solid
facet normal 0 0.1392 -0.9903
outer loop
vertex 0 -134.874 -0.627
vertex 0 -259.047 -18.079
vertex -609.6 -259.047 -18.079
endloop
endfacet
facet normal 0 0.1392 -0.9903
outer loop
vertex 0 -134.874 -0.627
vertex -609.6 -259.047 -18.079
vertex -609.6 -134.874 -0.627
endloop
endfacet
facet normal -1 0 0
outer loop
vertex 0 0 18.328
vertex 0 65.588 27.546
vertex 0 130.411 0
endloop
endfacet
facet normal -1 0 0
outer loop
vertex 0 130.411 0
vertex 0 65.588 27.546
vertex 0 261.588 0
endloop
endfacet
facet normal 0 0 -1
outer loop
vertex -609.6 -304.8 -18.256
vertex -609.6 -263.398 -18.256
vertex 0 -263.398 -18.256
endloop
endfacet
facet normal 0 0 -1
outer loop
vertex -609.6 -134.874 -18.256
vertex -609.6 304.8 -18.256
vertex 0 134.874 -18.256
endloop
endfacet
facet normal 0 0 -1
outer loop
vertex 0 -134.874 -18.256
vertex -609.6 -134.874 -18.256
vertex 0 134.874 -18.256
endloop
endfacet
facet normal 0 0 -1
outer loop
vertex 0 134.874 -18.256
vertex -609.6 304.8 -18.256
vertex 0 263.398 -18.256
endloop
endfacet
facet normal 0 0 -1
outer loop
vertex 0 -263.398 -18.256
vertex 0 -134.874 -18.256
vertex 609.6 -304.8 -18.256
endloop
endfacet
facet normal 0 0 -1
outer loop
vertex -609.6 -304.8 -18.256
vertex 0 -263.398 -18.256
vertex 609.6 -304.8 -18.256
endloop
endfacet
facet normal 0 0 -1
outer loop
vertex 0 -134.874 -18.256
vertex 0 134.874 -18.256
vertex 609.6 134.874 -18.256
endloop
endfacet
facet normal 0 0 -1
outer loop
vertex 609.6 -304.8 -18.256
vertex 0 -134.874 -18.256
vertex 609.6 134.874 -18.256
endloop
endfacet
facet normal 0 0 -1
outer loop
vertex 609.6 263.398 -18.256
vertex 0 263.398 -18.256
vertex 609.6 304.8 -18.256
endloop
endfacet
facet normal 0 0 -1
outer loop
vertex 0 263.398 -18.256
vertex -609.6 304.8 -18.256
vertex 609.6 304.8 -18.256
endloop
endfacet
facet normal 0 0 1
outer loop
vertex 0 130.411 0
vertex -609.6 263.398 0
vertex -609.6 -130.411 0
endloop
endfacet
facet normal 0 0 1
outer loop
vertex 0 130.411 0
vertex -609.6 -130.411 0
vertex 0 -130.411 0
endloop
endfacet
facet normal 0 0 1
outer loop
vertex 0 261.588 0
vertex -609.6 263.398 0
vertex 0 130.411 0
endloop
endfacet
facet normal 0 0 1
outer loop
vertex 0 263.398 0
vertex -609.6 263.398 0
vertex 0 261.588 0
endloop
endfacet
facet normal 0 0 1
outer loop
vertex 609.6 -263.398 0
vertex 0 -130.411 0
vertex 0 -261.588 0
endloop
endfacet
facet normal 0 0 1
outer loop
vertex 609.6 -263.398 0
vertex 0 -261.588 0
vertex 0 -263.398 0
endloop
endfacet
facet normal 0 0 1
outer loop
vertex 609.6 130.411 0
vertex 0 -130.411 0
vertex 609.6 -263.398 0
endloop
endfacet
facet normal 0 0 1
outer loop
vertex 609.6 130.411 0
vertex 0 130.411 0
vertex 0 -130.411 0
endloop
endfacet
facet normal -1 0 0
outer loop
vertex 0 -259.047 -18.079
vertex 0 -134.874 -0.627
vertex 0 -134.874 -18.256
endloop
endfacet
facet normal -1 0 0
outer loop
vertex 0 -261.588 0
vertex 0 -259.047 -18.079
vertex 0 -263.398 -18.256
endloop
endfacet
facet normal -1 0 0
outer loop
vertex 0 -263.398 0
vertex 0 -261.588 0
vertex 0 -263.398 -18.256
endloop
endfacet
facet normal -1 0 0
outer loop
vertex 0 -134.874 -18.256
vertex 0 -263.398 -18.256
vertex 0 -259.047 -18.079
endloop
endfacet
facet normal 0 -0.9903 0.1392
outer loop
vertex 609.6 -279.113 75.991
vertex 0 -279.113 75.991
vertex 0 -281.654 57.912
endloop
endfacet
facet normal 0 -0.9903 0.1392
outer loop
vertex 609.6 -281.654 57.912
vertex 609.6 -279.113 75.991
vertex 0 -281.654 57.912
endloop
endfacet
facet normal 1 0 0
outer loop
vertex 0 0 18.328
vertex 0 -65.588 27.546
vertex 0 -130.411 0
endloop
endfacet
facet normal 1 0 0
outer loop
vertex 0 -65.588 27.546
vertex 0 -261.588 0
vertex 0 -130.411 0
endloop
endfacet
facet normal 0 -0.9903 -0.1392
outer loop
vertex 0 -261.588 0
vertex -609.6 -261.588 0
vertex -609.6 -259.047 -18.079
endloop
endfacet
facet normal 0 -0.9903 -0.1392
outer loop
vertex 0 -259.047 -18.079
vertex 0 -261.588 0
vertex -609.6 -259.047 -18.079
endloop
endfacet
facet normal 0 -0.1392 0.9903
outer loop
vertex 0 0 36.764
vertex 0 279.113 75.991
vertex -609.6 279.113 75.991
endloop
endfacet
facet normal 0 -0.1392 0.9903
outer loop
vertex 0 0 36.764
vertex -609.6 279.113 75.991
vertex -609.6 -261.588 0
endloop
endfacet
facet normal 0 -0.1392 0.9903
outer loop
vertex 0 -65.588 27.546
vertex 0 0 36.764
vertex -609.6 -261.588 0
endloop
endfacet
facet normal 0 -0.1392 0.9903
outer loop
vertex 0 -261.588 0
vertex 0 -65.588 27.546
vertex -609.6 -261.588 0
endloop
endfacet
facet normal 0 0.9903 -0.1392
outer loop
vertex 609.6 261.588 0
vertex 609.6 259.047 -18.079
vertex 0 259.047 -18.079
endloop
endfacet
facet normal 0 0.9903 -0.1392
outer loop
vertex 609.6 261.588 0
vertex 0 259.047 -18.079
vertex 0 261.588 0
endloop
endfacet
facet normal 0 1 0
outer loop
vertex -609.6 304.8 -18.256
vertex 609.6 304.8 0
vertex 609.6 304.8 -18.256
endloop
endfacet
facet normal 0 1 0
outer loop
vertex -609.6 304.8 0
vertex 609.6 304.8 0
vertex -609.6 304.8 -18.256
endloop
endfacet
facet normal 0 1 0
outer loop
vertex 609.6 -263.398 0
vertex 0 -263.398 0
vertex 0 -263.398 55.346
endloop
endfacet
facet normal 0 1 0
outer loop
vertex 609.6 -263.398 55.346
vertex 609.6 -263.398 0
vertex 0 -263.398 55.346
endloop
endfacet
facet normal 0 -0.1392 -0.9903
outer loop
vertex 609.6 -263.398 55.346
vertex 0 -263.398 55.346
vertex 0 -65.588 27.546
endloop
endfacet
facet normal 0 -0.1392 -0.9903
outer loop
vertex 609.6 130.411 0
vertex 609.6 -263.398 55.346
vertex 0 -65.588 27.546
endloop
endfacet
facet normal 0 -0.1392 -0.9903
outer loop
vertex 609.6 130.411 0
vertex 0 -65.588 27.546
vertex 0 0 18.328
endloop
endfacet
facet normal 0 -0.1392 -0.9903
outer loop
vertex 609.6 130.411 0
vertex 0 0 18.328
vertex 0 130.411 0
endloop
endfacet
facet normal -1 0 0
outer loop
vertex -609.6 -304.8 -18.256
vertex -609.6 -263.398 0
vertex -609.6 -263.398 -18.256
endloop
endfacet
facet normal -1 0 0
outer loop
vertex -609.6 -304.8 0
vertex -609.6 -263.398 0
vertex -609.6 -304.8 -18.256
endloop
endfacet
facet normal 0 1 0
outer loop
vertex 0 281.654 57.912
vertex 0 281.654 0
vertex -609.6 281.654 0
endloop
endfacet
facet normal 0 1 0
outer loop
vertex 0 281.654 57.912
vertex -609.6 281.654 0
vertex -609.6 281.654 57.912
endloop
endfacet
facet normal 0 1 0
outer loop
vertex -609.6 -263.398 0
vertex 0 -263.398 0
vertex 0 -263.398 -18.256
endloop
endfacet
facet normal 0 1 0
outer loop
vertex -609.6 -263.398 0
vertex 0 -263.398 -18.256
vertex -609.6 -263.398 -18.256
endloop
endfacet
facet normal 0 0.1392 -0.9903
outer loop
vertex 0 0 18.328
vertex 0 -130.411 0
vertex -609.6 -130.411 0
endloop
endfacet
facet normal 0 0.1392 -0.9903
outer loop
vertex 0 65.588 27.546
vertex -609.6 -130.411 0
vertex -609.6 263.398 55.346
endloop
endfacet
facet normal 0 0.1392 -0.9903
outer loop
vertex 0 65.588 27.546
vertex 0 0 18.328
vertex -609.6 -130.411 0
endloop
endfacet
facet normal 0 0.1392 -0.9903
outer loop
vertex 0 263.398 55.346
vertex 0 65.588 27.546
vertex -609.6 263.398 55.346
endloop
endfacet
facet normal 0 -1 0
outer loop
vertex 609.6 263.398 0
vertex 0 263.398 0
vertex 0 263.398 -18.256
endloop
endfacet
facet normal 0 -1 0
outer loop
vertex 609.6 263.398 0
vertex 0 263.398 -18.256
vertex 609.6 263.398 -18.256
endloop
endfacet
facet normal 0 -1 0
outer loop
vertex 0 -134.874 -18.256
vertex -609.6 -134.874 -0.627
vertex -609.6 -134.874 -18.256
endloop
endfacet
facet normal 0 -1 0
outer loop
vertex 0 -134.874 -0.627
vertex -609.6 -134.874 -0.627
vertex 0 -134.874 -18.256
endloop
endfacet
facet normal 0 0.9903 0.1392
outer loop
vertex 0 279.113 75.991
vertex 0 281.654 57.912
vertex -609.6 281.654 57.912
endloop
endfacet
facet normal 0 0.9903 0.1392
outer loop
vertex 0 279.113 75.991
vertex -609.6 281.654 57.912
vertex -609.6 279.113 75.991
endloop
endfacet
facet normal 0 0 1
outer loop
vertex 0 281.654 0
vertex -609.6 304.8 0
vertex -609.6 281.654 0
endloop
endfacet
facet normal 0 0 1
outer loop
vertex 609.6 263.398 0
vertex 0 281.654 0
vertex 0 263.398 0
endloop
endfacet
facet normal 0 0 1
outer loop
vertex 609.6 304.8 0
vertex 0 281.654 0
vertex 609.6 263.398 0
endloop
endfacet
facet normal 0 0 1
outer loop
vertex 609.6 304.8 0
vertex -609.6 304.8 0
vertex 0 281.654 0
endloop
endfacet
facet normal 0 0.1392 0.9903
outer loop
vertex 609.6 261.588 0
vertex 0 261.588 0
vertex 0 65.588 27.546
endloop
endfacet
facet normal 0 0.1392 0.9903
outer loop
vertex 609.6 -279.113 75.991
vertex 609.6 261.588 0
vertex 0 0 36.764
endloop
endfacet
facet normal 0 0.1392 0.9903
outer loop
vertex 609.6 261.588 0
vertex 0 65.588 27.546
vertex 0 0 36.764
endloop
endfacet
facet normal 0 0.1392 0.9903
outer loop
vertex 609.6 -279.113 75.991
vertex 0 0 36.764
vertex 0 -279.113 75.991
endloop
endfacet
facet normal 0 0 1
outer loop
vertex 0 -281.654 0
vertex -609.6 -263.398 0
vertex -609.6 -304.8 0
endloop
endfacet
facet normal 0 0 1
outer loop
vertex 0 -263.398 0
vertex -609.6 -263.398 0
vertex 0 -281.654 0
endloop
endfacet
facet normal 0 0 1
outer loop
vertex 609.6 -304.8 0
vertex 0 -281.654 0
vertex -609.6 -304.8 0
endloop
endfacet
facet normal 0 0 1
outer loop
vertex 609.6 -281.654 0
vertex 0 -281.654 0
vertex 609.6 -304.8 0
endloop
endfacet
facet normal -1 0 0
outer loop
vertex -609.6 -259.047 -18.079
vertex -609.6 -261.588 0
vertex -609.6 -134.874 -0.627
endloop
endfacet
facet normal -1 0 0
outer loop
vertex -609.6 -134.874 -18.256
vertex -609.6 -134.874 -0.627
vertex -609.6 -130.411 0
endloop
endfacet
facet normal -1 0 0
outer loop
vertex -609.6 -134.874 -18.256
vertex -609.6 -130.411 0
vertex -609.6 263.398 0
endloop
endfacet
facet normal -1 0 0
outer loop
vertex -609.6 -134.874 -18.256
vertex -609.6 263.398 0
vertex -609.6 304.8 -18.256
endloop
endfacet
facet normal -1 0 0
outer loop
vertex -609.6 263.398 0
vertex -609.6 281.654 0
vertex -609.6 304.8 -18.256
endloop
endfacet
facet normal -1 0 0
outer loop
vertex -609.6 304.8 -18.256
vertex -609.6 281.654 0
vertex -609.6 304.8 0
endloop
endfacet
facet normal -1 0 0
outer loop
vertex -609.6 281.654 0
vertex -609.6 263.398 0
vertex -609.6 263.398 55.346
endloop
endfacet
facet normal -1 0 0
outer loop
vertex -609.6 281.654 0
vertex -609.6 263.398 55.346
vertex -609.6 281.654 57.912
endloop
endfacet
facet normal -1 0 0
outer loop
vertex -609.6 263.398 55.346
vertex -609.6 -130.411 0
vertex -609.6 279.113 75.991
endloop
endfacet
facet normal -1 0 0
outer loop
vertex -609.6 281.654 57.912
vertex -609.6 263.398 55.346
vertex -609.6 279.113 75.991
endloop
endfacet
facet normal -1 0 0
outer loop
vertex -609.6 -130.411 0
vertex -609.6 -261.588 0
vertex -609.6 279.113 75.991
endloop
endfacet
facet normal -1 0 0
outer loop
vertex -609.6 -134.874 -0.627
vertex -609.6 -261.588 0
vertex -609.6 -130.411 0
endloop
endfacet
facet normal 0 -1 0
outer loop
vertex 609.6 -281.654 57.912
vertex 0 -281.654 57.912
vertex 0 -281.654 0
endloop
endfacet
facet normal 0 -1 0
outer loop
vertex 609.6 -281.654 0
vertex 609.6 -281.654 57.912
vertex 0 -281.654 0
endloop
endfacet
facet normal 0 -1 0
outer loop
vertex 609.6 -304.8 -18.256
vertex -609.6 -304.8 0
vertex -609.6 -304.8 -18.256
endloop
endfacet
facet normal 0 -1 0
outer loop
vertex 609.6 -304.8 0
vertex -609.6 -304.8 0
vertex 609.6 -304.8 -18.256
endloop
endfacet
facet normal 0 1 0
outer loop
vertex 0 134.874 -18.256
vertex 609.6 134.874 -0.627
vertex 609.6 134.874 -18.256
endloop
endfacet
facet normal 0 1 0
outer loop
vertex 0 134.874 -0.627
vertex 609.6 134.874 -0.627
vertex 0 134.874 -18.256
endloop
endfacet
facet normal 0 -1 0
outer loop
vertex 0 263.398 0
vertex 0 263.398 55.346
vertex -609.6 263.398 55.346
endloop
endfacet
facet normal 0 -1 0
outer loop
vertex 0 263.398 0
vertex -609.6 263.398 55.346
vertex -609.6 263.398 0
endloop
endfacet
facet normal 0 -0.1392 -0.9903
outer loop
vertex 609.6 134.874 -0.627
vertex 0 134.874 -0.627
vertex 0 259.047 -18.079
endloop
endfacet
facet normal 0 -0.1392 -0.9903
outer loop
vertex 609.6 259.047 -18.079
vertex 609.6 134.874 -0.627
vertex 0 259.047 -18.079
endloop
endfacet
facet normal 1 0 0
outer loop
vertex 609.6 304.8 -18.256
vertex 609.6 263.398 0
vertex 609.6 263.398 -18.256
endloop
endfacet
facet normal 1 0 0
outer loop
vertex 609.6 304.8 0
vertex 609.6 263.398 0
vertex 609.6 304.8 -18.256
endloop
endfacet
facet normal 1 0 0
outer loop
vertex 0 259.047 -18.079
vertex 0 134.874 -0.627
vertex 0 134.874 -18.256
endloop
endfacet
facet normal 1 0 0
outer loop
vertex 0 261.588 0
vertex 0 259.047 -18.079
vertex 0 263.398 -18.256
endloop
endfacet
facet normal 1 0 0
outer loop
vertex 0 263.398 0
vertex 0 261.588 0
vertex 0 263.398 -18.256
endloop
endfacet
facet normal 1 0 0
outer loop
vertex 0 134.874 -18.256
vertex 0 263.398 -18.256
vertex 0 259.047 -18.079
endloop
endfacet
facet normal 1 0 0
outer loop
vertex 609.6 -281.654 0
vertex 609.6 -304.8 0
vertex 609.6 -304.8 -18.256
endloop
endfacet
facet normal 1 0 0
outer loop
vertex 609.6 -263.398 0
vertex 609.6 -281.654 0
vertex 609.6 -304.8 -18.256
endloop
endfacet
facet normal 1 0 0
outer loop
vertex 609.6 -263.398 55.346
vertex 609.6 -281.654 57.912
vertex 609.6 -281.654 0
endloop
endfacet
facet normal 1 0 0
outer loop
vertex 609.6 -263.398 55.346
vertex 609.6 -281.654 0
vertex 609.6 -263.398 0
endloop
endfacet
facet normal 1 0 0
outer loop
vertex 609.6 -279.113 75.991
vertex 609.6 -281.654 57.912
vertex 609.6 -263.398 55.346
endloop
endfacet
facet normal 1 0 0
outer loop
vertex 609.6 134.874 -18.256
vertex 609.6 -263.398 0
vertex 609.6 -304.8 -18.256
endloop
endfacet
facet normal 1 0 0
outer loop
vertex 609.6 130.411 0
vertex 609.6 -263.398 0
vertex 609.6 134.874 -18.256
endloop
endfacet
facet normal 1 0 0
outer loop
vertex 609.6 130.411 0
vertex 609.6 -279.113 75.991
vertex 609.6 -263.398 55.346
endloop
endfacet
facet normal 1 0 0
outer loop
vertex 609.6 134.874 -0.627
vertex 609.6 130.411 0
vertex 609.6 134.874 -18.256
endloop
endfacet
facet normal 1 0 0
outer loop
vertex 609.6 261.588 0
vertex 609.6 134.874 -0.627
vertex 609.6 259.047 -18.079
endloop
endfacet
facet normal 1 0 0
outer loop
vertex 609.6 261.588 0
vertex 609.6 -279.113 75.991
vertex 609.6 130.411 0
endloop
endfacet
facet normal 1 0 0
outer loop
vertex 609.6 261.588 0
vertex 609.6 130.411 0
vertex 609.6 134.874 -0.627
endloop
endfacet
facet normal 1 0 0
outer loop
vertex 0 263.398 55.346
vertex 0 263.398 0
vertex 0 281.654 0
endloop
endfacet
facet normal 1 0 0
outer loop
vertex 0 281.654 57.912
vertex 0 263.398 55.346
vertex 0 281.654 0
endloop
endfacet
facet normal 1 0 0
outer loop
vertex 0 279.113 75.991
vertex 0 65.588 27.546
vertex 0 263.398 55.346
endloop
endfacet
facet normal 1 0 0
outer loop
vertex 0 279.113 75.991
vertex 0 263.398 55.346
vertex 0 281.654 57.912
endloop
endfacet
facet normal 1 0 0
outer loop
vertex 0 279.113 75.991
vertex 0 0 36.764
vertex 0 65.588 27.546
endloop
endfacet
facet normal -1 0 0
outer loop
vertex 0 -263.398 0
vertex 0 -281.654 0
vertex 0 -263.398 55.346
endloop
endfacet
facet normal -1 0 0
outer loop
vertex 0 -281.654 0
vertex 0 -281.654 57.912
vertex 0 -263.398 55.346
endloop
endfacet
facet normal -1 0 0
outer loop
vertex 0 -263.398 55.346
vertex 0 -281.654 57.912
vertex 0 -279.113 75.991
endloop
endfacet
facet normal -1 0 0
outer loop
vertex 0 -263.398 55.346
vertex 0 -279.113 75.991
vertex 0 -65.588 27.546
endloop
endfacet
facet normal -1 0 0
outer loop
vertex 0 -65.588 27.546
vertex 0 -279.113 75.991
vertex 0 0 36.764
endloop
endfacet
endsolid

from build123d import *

# Parameters (mm, degrees)
F1_DEPTH = 18.25625
F3_DEPTH = 609.6
F4_DEPTH = 609.6


with BuildPart() as f1:
    # F0 (on Top) → F1 (new body)
    with BuildSketch(Plane.XY):
        Polygon((609.6, 263.398), (609.6, 304.8), (-609.6, 304.8), (-609.6, -134.874), (0, -134.874), (0, -263.398), (-609.6, -263.398), (-609.6, -304.8), (609.6, -304.8), (609.6, 134.874), (0, 134.874), (0, 263.398), align=None)
    extrude(amount=-F1_DEPTH)

    # F2 (on Right) → F3 (join, through all)
    with BuildSketch(Plane.YZ):
        Polygon((65.5882849274, 27.5459089179), (263.398, 55.3462513865), (281.65425, 57.912), (279.1134710756, 75.99058143), (0, 36.7637412283), align=None)
        Polygon((263.398, 55.3462513865), (263.398, 0), (281.65425, 0), (281.65425, 57.912), align=None)
        Polygon((0, 18.3280766075), (65.5882849274, 27.5459089179), (0, 36.7637412283), (-65.5882849274, 27.5459089179), align=None)
        Polygon((-259.0468322931, -18.07858143), (0, 18.3280766075), (-65.5882849274, 27.5459089179), (-261.5876112175, 0), align=None)
    extrude(amount=-F3_DEPTH)

    # F2 (on Right) → F4 (join, through all)
    with BuildSketch(Plane.YZ):
        Polygon((-263.398, 0), (-263.398, 55.3462513865), (-281.65425, 57.912), (-281.65425, 0), align=None)
        Polygon((-65.5882849274, 27.5459089179), (0, 36.7637412283), (-279.1134710756, 75.99058143), (-281.65425, 57.912), (-263.398, 55.3462513865), align=None)
        Polygon((0, 18.3280766075), (65.5882849274, 27.5459089179), (0, 36.7637412283), (-65.5882849274, 27.5459089179), align=None)
        Polygon((261.5876112175, 0), (65.5882849274, 27.5459089179), (0, 18.3280766075), (259.0468322931, -18.07858143), align=None)
    extrude(amount=F4_DEPTH)


solid = f1.part
